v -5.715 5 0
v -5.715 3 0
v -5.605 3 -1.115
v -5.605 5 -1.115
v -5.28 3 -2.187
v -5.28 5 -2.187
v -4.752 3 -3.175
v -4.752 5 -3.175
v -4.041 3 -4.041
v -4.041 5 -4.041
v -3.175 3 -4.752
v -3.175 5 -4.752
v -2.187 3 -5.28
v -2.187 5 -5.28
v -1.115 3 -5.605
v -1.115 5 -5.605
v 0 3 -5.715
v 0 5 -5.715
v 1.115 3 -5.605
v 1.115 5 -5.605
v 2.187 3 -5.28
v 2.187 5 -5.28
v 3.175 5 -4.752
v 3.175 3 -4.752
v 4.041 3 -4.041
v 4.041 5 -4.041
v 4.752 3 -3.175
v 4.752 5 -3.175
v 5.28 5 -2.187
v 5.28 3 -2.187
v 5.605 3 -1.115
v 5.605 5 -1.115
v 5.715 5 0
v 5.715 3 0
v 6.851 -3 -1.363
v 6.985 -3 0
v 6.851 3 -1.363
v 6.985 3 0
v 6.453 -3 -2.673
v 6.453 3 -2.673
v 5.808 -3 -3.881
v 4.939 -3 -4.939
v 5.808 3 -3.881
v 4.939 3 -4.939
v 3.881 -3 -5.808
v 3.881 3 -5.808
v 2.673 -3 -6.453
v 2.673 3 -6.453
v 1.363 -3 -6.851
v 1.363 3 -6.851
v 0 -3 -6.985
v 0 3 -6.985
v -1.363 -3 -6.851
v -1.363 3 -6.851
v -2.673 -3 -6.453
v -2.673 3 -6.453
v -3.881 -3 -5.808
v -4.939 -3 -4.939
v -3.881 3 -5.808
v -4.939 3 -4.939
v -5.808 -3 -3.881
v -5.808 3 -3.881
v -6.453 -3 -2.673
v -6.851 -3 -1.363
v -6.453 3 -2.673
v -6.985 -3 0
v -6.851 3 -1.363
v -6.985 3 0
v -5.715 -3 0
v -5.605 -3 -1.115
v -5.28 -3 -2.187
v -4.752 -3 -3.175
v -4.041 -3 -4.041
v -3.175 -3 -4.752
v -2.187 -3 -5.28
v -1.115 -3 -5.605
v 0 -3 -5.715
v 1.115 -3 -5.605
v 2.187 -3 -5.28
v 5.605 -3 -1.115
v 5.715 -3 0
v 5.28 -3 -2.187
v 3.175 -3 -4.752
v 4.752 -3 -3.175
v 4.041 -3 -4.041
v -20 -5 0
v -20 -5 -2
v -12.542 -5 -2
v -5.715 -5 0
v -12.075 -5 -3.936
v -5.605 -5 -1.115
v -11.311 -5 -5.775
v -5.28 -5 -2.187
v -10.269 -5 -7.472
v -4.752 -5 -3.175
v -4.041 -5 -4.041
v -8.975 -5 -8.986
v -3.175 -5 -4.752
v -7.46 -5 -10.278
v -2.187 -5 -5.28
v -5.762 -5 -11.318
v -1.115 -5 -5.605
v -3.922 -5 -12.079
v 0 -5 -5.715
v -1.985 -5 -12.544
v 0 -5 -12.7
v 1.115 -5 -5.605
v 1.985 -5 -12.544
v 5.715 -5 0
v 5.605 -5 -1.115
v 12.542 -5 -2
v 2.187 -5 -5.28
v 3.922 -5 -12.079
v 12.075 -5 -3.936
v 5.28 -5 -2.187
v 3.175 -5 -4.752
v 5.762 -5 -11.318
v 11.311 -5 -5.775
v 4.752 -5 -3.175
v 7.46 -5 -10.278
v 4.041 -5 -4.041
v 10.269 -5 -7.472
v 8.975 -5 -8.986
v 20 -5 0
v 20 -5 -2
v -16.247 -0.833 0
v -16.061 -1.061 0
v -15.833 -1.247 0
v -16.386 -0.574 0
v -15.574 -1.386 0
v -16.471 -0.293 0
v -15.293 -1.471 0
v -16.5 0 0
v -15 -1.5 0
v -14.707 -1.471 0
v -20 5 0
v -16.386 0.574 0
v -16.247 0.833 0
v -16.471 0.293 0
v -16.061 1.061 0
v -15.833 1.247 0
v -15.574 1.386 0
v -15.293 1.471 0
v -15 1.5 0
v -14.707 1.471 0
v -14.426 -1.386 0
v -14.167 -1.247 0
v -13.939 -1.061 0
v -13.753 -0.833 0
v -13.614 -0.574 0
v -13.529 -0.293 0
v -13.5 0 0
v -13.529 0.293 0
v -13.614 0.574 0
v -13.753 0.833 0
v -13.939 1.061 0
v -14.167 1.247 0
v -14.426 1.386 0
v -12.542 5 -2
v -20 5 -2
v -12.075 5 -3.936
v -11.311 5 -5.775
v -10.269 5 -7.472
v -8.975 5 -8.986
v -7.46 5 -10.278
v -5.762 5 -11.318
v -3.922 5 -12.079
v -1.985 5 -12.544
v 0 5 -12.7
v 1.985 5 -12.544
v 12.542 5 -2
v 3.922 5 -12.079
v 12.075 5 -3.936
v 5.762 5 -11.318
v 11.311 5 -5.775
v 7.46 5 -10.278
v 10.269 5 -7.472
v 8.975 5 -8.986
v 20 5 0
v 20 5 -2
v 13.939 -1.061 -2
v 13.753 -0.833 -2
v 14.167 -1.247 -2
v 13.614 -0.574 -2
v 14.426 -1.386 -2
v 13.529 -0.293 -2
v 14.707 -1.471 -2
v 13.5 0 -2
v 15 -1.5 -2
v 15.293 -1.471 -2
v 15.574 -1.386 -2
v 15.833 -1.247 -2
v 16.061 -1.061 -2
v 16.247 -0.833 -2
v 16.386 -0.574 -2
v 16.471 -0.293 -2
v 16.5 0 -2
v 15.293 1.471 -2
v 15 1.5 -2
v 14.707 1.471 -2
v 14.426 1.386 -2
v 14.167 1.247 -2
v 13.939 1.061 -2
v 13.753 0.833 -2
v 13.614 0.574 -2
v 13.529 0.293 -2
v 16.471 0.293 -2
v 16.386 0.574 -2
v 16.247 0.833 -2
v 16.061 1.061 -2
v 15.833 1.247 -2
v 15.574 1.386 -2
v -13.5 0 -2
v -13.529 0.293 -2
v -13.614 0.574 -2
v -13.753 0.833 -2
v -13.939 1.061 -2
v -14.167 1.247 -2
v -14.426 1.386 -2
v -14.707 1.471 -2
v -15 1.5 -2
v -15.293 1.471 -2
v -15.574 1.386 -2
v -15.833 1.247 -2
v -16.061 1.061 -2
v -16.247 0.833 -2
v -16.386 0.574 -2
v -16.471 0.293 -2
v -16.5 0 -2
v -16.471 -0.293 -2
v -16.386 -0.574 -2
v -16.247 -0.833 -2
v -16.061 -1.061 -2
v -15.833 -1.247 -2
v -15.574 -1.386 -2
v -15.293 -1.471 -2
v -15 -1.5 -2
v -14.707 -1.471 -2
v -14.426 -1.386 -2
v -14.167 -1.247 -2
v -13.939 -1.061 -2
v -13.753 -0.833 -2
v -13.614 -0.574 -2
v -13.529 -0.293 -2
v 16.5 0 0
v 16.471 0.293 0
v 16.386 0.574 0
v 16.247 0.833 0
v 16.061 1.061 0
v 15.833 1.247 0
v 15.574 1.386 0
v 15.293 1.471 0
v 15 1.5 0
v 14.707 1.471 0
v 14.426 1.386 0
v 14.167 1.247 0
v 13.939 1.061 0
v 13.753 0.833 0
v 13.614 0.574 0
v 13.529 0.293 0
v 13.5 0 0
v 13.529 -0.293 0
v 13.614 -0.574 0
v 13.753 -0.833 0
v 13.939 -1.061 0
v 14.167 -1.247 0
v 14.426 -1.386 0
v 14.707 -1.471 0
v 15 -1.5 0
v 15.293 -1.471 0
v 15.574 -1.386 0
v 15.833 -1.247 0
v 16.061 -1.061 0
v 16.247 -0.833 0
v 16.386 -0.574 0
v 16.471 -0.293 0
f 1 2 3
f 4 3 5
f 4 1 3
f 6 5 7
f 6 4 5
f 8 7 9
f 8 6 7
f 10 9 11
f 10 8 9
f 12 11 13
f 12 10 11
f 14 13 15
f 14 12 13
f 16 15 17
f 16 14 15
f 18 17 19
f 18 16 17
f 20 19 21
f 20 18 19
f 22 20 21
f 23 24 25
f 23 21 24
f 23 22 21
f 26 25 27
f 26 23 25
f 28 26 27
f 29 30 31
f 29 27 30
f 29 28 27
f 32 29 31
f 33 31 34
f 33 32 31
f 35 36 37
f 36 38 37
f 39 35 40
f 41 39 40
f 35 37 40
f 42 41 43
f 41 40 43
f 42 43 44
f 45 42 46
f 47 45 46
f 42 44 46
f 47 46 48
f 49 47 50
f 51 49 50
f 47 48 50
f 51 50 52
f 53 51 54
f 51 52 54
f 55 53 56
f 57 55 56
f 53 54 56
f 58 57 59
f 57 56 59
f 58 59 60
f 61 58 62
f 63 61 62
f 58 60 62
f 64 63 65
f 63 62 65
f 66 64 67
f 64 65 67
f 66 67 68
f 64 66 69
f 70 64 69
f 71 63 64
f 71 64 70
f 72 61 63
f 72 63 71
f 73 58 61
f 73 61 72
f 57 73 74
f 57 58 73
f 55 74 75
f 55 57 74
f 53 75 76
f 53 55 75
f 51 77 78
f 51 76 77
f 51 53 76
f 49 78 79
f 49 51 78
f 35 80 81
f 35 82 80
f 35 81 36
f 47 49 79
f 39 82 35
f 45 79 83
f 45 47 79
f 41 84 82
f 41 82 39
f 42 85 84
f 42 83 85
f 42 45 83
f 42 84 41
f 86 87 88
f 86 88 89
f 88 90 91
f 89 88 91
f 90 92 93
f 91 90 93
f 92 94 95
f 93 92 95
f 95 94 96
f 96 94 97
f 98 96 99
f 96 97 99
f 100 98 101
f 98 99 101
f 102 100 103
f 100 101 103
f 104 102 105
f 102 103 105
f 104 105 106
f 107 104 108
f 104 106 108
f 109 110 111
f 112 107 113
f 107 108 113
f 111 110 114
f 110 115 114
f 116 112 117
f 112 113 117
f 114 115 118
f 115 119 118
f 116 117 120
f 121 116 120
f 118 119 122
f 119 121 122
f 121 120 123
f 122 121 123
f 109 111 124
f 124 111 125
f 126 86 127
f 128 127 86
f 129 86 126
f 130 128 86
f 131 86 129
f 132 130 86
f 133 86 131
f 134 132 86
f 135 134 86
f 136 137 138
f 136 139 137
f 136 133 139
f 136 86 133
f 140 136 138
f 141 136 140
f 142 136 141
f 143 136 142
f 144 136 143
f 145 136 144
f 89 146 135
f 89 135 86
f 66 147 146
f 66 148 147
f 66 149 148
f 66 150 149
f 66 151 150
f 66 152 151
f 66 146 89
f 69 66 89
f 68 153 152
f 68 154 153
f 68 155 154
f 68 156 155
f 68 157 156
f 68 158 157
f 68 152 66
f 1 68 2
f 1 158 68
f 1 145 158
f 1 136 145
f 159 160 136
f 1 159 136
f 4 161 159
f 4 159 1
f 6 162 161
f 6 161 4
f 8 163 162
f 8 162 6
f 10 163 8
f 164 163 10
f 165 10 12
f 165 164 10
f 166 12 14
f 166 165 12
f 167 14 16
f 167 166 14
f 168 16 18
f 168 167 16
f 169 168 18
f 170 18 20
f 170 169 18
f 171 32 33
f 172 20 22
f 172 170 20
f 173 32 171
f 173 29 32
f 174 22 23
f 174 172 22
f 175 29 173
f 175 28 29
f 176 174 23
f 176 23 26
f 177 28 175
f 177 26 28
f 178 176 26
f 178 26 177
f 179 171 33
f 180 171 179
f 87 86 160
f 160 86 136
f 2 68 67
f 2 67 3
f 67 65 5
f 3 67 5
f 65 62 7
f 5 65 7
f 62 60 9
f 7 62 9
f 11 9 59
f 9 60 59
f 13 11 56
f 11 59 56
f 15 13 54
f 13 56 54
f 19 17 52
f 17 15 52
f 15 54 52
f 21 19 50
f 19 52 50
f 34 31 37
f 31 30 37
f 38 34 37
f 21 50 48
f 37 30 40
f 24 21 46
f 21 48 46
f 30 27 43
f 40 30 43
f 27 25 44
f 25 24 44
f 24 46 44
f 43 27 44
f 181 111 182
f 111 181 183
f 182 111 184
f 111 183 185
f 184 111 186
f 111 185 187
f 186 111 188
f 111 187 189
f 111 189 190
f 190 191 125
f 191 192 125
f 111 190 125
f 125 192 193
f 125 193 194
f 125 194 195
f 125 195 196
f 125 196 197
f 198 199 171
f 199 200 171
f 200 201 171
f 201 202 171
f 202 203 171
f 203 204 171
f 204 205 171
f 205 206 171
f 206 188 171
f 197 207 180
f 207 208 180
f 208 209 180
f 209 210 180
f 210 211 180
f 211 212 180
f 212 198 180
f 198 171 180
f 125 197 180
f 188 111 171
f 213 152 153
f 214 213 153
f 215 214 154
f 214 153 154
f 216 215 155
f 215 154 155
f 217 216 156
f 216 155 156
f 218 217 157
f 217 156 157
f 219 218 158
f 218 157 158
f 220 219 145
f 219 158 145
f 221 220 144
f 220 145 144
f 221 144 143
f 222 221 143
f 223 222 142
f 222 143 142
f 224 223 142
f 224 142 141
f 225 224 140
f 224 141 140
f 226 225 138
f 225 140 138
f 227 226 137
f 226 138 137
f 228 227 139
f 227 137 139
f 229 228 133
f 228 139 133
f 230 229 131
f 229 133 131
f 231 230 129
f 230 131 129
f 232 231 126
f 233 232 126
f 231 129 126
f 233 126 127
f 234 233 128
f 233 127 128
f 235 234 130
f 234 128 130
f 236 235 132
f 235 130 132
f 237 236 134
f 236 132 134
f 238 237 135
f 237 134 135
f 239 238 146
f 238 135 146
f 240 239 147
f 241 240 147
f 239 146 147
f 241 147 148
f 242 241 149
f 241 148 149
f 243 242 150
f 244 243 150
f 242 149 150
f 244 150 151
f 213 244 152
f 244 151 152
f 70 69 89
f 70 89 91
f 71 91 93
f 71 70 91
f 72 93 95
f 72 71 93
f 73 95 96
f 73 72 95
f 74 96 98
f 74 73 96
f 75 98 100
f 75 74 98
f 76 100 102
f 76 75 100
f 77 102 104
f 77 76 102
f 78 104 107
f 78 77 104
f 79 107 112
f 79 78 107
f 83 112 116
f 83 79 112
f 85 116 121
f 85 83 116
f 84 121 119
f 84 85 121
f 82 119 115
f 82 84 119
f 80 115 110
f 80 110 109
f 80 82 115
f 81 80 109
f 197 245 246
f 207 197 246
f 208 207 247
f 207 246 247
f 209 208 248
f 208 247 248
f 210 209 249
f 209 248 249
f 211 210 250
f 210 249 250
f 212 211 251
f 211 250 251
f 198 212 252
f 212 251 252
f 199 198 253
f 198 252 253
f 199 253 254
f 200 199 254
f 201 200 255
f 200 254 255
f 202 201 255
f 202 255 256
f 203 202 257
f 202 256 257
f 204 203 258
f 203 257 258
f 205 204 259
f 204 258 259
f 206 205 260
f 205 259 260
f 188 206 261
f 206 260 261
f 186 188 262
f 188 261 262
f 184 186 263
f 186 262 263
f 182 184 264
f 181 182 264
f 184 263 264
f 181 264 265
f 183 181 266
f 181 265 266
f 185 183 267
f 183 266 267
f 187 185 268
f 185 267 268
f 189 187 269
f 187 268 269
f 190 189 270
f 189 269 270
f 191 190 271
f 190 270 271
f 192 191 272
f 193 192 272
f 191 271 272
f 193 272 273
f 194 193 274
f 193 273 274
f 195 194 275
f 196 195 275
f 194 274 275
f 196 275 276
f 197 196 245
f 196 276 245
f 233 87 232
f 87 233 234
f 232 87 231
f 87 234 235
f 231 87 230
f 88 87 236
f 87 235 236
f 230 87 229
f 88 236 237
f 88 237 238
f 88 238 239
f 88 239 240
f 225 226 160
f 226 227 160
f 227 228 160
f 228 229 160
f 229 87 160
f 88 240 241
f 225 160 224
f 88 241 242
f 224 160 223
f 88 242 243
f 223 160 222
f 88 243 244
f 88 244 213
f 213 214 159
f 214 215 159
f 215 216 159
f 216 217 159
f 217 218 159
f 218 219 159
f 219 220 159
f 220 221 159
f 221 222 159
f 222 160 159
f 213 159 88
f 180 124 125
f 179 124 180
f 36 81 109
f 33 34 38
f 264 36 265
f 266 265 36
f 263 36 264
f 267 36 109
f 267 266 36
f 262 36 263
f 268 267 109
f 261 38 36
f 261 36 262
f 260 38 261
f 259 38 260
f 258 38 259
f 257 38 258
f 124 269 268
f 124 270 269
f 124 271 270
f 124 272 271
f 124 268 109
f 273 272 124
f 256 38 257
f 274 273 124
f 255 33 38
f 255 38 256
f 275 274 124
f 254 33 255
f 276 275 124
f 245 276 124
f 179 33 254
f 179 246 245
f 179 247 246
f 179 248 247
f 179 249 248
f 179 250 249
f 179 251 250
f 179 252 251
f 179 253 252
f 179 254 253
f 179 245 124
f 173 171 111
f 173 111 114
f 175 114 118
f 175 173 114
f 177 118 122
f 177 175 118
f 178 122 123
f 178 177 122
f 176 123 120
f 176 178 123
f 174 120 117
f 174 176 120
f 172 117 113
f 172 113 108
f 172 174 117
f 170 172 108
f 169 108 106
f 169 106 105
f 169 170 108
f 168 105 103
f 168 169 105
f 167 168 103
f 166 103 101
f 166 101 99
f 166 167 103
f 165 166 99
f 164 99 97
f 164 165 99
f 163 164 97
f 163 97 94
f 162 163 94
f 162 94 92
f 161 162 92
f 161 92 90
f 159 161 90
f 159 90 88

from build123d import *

# Parameters (mm, degrees)
BOSS_EXTRUDE1_DEPTH = 5
CUT_EXTRUDE1_DEPTH  = 3
SKETCH3_W           = 9
SKETCH3_H           = 10
SKETCH3_R           = 1.5
BOSS_EXTRUDE2_DEPTH = 2


with BuildPart() as part:
    # Sketch1 → Boss-Extrude1 (new body, symmetric)
    with BuildSketch(Plane(origin=(0, 0, 0), x_dir=(1, 0, 0), z_dir=(0, 1, 0))):
        with BuildLine():
            Line((5.715, 0), (12.7, 0))
            ThreePointArc((12.7, 0), (0, 12.7), (-12.7, 0))
            Line((-12.7, 0), (-5.715, 0))
            ThreePointArc((-5.715, 0), (0, 5.715), (5.715, 0))
        make_face()
    extrude(amount=BOSS_EXTRUDE1_DEPTH, both=True)

    # Sketch2 → Cut-Extrude1 (cut, symmetric)
    with BuildSketch(Plane(origin=(0, 0, 0), x_dir=(1, 0, 0), z_dir=(0, 1, 0))):
        with BuildLine():
            ThreePointArc((6.985, 0), (0, 6.985), (-6.985, 0))
            Line((-6.985, 0), (6.985, 0))
        make_face()
        with BuildLine():
            Line((6.985, 0), (-6.985, 0))
            ThreePointArc((-6.985, 0), (0, -6.985), (6.985, 0))
        make_face()
    extrude(amount=CUT_EXTRUDE1_DEPTH, both=True, mode=Mode.SUBTRACT)

    # Sketch3 → Boss-Extrude2 (add)
    with BuildSketch(Plane.XY):
        with Locations((15.5, 0)):
            Rectangle(SKETCH3_W, SKETCH3_H)
        with Locations((15, 0)):
            Circle(SKETCH3_R, mode=Mode.SUBTRACT)
        with Locations((-15.5, 0)):
            Rectangle(SKETCH3_W, SKETCH3_H)
        with Locations((-15, 0)):
            Circle(SKETCH3_R, mode=Mode.SUBTRACT)
    extrude(amount=-BOSS_EXTRUDE2_DEPTH)


solid = part.part
